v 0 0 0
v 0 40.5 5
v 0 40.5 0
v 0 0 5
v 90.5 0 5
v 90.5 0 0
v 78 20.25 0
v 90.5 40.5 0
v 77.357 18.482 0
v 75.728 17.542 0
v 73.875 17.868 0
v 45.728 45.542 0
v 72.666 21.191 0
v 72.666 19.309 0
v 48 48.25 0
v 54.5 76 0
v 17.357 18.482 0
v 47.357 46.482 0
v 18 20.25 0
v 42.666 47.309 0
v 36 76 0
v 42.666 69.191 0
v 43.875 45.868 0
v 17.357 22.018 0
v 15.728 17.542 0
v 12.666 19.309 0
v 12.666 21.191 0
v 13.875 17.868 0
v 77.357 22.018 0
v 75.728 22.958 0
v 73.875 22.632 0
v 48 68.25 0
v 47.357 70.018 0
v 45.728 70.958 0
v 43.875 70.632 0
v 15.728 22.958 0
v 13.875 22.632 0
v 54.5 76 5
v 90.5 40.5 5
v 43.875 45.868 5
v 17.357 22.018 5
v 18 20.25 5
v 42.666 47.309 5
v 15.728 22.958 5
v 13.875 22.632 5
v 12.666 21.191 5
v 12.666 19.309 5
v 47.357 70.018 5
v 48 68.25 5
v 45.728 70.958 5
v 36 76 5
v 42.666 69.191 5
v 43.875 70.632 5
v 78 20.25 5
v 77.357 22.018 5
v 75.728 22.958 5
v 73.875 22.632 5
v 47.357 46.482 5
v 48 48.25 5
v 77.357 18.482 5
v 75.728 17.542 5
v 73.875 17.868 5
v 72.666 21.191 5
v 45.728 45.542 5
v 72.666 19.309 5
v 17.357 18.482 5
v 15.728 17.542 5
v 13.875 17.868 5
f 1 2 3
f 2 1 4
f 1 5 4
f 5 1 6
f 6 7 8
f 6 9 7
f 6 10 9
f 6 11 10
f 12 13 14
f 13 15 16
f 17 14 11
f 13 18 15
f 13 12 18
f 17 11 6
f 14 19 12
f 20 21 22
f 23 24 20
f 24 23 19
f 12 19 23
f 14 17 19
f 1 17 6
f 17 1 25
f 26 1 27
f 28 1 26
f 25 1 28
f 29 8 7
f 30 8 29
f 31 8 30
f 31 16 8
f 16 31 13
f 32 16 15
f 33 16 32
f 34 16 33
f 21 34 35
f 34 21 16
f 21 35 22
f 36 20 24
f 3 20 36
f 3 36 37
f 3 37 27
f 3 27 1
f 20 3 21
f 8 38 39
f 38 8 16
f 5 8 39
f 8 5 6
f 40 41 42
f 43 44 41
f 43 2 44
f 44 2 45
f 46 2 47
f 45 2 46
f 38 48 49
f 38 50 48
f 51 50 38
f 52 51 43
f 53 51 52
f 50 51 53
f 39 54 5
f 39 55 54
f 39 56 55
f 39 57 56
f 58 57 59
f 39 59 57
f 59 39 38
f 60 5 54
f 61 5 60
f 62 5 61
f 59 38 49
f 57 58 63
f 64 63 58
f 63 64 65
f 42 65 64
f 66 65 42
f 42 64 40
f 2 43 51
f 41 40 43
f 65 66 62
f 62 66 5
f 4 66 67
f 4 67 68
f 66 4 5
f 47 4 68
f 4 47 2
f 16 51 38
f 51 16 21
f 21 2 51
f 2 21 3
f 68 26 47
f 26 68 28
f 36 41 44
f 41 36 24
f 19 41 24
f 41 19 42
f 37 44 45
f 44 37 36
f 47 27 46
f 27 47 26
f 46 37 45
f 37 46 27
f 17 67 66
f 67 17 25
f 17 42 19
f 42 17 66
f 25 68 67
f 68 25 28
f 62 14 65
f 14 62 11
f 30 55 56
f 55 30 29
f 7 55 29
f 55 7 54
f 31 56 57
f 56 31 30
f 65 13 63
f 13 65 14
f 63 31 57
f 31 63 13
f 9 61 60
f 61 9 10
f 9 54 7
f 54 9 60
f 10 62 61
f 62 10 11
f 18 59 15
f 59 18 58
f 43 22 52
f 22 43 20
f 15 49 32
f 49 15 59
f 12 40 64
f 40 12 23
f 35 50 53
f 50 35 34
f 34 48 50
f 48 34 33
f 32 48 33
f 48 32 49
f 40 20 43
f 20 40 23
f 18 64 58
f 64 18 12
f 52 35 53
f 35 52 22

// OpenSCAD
// Uncomment before final render
//$fa = 0.01;
//$fs = 0.25;

module xAxisPulleyMount() {
  difference() {
    hull() {
      cube([90.5, 40.5, 5]);
      translate([36, 40.5, 0]) {
        cube([18.5, 35.5, 5]);
      }
    }
    translate([15.25, 20.25, -1]) {
      cylinder(7, 2.75, 2.75);
    }
    translate([75.25, 20.25, -1]) {
      cylinder(7, 2.75, 2.75);
    }
    hull() {
      translate([45.25, 48.25, -1]) {
        cylinder(7, 2.75, 2.75);
      }
      translate([45.25, 68.25, -1]) {
        cylinder(7, 2.75, 2.75);
      }
    }
  }
}

xAxisPulleyMount();
